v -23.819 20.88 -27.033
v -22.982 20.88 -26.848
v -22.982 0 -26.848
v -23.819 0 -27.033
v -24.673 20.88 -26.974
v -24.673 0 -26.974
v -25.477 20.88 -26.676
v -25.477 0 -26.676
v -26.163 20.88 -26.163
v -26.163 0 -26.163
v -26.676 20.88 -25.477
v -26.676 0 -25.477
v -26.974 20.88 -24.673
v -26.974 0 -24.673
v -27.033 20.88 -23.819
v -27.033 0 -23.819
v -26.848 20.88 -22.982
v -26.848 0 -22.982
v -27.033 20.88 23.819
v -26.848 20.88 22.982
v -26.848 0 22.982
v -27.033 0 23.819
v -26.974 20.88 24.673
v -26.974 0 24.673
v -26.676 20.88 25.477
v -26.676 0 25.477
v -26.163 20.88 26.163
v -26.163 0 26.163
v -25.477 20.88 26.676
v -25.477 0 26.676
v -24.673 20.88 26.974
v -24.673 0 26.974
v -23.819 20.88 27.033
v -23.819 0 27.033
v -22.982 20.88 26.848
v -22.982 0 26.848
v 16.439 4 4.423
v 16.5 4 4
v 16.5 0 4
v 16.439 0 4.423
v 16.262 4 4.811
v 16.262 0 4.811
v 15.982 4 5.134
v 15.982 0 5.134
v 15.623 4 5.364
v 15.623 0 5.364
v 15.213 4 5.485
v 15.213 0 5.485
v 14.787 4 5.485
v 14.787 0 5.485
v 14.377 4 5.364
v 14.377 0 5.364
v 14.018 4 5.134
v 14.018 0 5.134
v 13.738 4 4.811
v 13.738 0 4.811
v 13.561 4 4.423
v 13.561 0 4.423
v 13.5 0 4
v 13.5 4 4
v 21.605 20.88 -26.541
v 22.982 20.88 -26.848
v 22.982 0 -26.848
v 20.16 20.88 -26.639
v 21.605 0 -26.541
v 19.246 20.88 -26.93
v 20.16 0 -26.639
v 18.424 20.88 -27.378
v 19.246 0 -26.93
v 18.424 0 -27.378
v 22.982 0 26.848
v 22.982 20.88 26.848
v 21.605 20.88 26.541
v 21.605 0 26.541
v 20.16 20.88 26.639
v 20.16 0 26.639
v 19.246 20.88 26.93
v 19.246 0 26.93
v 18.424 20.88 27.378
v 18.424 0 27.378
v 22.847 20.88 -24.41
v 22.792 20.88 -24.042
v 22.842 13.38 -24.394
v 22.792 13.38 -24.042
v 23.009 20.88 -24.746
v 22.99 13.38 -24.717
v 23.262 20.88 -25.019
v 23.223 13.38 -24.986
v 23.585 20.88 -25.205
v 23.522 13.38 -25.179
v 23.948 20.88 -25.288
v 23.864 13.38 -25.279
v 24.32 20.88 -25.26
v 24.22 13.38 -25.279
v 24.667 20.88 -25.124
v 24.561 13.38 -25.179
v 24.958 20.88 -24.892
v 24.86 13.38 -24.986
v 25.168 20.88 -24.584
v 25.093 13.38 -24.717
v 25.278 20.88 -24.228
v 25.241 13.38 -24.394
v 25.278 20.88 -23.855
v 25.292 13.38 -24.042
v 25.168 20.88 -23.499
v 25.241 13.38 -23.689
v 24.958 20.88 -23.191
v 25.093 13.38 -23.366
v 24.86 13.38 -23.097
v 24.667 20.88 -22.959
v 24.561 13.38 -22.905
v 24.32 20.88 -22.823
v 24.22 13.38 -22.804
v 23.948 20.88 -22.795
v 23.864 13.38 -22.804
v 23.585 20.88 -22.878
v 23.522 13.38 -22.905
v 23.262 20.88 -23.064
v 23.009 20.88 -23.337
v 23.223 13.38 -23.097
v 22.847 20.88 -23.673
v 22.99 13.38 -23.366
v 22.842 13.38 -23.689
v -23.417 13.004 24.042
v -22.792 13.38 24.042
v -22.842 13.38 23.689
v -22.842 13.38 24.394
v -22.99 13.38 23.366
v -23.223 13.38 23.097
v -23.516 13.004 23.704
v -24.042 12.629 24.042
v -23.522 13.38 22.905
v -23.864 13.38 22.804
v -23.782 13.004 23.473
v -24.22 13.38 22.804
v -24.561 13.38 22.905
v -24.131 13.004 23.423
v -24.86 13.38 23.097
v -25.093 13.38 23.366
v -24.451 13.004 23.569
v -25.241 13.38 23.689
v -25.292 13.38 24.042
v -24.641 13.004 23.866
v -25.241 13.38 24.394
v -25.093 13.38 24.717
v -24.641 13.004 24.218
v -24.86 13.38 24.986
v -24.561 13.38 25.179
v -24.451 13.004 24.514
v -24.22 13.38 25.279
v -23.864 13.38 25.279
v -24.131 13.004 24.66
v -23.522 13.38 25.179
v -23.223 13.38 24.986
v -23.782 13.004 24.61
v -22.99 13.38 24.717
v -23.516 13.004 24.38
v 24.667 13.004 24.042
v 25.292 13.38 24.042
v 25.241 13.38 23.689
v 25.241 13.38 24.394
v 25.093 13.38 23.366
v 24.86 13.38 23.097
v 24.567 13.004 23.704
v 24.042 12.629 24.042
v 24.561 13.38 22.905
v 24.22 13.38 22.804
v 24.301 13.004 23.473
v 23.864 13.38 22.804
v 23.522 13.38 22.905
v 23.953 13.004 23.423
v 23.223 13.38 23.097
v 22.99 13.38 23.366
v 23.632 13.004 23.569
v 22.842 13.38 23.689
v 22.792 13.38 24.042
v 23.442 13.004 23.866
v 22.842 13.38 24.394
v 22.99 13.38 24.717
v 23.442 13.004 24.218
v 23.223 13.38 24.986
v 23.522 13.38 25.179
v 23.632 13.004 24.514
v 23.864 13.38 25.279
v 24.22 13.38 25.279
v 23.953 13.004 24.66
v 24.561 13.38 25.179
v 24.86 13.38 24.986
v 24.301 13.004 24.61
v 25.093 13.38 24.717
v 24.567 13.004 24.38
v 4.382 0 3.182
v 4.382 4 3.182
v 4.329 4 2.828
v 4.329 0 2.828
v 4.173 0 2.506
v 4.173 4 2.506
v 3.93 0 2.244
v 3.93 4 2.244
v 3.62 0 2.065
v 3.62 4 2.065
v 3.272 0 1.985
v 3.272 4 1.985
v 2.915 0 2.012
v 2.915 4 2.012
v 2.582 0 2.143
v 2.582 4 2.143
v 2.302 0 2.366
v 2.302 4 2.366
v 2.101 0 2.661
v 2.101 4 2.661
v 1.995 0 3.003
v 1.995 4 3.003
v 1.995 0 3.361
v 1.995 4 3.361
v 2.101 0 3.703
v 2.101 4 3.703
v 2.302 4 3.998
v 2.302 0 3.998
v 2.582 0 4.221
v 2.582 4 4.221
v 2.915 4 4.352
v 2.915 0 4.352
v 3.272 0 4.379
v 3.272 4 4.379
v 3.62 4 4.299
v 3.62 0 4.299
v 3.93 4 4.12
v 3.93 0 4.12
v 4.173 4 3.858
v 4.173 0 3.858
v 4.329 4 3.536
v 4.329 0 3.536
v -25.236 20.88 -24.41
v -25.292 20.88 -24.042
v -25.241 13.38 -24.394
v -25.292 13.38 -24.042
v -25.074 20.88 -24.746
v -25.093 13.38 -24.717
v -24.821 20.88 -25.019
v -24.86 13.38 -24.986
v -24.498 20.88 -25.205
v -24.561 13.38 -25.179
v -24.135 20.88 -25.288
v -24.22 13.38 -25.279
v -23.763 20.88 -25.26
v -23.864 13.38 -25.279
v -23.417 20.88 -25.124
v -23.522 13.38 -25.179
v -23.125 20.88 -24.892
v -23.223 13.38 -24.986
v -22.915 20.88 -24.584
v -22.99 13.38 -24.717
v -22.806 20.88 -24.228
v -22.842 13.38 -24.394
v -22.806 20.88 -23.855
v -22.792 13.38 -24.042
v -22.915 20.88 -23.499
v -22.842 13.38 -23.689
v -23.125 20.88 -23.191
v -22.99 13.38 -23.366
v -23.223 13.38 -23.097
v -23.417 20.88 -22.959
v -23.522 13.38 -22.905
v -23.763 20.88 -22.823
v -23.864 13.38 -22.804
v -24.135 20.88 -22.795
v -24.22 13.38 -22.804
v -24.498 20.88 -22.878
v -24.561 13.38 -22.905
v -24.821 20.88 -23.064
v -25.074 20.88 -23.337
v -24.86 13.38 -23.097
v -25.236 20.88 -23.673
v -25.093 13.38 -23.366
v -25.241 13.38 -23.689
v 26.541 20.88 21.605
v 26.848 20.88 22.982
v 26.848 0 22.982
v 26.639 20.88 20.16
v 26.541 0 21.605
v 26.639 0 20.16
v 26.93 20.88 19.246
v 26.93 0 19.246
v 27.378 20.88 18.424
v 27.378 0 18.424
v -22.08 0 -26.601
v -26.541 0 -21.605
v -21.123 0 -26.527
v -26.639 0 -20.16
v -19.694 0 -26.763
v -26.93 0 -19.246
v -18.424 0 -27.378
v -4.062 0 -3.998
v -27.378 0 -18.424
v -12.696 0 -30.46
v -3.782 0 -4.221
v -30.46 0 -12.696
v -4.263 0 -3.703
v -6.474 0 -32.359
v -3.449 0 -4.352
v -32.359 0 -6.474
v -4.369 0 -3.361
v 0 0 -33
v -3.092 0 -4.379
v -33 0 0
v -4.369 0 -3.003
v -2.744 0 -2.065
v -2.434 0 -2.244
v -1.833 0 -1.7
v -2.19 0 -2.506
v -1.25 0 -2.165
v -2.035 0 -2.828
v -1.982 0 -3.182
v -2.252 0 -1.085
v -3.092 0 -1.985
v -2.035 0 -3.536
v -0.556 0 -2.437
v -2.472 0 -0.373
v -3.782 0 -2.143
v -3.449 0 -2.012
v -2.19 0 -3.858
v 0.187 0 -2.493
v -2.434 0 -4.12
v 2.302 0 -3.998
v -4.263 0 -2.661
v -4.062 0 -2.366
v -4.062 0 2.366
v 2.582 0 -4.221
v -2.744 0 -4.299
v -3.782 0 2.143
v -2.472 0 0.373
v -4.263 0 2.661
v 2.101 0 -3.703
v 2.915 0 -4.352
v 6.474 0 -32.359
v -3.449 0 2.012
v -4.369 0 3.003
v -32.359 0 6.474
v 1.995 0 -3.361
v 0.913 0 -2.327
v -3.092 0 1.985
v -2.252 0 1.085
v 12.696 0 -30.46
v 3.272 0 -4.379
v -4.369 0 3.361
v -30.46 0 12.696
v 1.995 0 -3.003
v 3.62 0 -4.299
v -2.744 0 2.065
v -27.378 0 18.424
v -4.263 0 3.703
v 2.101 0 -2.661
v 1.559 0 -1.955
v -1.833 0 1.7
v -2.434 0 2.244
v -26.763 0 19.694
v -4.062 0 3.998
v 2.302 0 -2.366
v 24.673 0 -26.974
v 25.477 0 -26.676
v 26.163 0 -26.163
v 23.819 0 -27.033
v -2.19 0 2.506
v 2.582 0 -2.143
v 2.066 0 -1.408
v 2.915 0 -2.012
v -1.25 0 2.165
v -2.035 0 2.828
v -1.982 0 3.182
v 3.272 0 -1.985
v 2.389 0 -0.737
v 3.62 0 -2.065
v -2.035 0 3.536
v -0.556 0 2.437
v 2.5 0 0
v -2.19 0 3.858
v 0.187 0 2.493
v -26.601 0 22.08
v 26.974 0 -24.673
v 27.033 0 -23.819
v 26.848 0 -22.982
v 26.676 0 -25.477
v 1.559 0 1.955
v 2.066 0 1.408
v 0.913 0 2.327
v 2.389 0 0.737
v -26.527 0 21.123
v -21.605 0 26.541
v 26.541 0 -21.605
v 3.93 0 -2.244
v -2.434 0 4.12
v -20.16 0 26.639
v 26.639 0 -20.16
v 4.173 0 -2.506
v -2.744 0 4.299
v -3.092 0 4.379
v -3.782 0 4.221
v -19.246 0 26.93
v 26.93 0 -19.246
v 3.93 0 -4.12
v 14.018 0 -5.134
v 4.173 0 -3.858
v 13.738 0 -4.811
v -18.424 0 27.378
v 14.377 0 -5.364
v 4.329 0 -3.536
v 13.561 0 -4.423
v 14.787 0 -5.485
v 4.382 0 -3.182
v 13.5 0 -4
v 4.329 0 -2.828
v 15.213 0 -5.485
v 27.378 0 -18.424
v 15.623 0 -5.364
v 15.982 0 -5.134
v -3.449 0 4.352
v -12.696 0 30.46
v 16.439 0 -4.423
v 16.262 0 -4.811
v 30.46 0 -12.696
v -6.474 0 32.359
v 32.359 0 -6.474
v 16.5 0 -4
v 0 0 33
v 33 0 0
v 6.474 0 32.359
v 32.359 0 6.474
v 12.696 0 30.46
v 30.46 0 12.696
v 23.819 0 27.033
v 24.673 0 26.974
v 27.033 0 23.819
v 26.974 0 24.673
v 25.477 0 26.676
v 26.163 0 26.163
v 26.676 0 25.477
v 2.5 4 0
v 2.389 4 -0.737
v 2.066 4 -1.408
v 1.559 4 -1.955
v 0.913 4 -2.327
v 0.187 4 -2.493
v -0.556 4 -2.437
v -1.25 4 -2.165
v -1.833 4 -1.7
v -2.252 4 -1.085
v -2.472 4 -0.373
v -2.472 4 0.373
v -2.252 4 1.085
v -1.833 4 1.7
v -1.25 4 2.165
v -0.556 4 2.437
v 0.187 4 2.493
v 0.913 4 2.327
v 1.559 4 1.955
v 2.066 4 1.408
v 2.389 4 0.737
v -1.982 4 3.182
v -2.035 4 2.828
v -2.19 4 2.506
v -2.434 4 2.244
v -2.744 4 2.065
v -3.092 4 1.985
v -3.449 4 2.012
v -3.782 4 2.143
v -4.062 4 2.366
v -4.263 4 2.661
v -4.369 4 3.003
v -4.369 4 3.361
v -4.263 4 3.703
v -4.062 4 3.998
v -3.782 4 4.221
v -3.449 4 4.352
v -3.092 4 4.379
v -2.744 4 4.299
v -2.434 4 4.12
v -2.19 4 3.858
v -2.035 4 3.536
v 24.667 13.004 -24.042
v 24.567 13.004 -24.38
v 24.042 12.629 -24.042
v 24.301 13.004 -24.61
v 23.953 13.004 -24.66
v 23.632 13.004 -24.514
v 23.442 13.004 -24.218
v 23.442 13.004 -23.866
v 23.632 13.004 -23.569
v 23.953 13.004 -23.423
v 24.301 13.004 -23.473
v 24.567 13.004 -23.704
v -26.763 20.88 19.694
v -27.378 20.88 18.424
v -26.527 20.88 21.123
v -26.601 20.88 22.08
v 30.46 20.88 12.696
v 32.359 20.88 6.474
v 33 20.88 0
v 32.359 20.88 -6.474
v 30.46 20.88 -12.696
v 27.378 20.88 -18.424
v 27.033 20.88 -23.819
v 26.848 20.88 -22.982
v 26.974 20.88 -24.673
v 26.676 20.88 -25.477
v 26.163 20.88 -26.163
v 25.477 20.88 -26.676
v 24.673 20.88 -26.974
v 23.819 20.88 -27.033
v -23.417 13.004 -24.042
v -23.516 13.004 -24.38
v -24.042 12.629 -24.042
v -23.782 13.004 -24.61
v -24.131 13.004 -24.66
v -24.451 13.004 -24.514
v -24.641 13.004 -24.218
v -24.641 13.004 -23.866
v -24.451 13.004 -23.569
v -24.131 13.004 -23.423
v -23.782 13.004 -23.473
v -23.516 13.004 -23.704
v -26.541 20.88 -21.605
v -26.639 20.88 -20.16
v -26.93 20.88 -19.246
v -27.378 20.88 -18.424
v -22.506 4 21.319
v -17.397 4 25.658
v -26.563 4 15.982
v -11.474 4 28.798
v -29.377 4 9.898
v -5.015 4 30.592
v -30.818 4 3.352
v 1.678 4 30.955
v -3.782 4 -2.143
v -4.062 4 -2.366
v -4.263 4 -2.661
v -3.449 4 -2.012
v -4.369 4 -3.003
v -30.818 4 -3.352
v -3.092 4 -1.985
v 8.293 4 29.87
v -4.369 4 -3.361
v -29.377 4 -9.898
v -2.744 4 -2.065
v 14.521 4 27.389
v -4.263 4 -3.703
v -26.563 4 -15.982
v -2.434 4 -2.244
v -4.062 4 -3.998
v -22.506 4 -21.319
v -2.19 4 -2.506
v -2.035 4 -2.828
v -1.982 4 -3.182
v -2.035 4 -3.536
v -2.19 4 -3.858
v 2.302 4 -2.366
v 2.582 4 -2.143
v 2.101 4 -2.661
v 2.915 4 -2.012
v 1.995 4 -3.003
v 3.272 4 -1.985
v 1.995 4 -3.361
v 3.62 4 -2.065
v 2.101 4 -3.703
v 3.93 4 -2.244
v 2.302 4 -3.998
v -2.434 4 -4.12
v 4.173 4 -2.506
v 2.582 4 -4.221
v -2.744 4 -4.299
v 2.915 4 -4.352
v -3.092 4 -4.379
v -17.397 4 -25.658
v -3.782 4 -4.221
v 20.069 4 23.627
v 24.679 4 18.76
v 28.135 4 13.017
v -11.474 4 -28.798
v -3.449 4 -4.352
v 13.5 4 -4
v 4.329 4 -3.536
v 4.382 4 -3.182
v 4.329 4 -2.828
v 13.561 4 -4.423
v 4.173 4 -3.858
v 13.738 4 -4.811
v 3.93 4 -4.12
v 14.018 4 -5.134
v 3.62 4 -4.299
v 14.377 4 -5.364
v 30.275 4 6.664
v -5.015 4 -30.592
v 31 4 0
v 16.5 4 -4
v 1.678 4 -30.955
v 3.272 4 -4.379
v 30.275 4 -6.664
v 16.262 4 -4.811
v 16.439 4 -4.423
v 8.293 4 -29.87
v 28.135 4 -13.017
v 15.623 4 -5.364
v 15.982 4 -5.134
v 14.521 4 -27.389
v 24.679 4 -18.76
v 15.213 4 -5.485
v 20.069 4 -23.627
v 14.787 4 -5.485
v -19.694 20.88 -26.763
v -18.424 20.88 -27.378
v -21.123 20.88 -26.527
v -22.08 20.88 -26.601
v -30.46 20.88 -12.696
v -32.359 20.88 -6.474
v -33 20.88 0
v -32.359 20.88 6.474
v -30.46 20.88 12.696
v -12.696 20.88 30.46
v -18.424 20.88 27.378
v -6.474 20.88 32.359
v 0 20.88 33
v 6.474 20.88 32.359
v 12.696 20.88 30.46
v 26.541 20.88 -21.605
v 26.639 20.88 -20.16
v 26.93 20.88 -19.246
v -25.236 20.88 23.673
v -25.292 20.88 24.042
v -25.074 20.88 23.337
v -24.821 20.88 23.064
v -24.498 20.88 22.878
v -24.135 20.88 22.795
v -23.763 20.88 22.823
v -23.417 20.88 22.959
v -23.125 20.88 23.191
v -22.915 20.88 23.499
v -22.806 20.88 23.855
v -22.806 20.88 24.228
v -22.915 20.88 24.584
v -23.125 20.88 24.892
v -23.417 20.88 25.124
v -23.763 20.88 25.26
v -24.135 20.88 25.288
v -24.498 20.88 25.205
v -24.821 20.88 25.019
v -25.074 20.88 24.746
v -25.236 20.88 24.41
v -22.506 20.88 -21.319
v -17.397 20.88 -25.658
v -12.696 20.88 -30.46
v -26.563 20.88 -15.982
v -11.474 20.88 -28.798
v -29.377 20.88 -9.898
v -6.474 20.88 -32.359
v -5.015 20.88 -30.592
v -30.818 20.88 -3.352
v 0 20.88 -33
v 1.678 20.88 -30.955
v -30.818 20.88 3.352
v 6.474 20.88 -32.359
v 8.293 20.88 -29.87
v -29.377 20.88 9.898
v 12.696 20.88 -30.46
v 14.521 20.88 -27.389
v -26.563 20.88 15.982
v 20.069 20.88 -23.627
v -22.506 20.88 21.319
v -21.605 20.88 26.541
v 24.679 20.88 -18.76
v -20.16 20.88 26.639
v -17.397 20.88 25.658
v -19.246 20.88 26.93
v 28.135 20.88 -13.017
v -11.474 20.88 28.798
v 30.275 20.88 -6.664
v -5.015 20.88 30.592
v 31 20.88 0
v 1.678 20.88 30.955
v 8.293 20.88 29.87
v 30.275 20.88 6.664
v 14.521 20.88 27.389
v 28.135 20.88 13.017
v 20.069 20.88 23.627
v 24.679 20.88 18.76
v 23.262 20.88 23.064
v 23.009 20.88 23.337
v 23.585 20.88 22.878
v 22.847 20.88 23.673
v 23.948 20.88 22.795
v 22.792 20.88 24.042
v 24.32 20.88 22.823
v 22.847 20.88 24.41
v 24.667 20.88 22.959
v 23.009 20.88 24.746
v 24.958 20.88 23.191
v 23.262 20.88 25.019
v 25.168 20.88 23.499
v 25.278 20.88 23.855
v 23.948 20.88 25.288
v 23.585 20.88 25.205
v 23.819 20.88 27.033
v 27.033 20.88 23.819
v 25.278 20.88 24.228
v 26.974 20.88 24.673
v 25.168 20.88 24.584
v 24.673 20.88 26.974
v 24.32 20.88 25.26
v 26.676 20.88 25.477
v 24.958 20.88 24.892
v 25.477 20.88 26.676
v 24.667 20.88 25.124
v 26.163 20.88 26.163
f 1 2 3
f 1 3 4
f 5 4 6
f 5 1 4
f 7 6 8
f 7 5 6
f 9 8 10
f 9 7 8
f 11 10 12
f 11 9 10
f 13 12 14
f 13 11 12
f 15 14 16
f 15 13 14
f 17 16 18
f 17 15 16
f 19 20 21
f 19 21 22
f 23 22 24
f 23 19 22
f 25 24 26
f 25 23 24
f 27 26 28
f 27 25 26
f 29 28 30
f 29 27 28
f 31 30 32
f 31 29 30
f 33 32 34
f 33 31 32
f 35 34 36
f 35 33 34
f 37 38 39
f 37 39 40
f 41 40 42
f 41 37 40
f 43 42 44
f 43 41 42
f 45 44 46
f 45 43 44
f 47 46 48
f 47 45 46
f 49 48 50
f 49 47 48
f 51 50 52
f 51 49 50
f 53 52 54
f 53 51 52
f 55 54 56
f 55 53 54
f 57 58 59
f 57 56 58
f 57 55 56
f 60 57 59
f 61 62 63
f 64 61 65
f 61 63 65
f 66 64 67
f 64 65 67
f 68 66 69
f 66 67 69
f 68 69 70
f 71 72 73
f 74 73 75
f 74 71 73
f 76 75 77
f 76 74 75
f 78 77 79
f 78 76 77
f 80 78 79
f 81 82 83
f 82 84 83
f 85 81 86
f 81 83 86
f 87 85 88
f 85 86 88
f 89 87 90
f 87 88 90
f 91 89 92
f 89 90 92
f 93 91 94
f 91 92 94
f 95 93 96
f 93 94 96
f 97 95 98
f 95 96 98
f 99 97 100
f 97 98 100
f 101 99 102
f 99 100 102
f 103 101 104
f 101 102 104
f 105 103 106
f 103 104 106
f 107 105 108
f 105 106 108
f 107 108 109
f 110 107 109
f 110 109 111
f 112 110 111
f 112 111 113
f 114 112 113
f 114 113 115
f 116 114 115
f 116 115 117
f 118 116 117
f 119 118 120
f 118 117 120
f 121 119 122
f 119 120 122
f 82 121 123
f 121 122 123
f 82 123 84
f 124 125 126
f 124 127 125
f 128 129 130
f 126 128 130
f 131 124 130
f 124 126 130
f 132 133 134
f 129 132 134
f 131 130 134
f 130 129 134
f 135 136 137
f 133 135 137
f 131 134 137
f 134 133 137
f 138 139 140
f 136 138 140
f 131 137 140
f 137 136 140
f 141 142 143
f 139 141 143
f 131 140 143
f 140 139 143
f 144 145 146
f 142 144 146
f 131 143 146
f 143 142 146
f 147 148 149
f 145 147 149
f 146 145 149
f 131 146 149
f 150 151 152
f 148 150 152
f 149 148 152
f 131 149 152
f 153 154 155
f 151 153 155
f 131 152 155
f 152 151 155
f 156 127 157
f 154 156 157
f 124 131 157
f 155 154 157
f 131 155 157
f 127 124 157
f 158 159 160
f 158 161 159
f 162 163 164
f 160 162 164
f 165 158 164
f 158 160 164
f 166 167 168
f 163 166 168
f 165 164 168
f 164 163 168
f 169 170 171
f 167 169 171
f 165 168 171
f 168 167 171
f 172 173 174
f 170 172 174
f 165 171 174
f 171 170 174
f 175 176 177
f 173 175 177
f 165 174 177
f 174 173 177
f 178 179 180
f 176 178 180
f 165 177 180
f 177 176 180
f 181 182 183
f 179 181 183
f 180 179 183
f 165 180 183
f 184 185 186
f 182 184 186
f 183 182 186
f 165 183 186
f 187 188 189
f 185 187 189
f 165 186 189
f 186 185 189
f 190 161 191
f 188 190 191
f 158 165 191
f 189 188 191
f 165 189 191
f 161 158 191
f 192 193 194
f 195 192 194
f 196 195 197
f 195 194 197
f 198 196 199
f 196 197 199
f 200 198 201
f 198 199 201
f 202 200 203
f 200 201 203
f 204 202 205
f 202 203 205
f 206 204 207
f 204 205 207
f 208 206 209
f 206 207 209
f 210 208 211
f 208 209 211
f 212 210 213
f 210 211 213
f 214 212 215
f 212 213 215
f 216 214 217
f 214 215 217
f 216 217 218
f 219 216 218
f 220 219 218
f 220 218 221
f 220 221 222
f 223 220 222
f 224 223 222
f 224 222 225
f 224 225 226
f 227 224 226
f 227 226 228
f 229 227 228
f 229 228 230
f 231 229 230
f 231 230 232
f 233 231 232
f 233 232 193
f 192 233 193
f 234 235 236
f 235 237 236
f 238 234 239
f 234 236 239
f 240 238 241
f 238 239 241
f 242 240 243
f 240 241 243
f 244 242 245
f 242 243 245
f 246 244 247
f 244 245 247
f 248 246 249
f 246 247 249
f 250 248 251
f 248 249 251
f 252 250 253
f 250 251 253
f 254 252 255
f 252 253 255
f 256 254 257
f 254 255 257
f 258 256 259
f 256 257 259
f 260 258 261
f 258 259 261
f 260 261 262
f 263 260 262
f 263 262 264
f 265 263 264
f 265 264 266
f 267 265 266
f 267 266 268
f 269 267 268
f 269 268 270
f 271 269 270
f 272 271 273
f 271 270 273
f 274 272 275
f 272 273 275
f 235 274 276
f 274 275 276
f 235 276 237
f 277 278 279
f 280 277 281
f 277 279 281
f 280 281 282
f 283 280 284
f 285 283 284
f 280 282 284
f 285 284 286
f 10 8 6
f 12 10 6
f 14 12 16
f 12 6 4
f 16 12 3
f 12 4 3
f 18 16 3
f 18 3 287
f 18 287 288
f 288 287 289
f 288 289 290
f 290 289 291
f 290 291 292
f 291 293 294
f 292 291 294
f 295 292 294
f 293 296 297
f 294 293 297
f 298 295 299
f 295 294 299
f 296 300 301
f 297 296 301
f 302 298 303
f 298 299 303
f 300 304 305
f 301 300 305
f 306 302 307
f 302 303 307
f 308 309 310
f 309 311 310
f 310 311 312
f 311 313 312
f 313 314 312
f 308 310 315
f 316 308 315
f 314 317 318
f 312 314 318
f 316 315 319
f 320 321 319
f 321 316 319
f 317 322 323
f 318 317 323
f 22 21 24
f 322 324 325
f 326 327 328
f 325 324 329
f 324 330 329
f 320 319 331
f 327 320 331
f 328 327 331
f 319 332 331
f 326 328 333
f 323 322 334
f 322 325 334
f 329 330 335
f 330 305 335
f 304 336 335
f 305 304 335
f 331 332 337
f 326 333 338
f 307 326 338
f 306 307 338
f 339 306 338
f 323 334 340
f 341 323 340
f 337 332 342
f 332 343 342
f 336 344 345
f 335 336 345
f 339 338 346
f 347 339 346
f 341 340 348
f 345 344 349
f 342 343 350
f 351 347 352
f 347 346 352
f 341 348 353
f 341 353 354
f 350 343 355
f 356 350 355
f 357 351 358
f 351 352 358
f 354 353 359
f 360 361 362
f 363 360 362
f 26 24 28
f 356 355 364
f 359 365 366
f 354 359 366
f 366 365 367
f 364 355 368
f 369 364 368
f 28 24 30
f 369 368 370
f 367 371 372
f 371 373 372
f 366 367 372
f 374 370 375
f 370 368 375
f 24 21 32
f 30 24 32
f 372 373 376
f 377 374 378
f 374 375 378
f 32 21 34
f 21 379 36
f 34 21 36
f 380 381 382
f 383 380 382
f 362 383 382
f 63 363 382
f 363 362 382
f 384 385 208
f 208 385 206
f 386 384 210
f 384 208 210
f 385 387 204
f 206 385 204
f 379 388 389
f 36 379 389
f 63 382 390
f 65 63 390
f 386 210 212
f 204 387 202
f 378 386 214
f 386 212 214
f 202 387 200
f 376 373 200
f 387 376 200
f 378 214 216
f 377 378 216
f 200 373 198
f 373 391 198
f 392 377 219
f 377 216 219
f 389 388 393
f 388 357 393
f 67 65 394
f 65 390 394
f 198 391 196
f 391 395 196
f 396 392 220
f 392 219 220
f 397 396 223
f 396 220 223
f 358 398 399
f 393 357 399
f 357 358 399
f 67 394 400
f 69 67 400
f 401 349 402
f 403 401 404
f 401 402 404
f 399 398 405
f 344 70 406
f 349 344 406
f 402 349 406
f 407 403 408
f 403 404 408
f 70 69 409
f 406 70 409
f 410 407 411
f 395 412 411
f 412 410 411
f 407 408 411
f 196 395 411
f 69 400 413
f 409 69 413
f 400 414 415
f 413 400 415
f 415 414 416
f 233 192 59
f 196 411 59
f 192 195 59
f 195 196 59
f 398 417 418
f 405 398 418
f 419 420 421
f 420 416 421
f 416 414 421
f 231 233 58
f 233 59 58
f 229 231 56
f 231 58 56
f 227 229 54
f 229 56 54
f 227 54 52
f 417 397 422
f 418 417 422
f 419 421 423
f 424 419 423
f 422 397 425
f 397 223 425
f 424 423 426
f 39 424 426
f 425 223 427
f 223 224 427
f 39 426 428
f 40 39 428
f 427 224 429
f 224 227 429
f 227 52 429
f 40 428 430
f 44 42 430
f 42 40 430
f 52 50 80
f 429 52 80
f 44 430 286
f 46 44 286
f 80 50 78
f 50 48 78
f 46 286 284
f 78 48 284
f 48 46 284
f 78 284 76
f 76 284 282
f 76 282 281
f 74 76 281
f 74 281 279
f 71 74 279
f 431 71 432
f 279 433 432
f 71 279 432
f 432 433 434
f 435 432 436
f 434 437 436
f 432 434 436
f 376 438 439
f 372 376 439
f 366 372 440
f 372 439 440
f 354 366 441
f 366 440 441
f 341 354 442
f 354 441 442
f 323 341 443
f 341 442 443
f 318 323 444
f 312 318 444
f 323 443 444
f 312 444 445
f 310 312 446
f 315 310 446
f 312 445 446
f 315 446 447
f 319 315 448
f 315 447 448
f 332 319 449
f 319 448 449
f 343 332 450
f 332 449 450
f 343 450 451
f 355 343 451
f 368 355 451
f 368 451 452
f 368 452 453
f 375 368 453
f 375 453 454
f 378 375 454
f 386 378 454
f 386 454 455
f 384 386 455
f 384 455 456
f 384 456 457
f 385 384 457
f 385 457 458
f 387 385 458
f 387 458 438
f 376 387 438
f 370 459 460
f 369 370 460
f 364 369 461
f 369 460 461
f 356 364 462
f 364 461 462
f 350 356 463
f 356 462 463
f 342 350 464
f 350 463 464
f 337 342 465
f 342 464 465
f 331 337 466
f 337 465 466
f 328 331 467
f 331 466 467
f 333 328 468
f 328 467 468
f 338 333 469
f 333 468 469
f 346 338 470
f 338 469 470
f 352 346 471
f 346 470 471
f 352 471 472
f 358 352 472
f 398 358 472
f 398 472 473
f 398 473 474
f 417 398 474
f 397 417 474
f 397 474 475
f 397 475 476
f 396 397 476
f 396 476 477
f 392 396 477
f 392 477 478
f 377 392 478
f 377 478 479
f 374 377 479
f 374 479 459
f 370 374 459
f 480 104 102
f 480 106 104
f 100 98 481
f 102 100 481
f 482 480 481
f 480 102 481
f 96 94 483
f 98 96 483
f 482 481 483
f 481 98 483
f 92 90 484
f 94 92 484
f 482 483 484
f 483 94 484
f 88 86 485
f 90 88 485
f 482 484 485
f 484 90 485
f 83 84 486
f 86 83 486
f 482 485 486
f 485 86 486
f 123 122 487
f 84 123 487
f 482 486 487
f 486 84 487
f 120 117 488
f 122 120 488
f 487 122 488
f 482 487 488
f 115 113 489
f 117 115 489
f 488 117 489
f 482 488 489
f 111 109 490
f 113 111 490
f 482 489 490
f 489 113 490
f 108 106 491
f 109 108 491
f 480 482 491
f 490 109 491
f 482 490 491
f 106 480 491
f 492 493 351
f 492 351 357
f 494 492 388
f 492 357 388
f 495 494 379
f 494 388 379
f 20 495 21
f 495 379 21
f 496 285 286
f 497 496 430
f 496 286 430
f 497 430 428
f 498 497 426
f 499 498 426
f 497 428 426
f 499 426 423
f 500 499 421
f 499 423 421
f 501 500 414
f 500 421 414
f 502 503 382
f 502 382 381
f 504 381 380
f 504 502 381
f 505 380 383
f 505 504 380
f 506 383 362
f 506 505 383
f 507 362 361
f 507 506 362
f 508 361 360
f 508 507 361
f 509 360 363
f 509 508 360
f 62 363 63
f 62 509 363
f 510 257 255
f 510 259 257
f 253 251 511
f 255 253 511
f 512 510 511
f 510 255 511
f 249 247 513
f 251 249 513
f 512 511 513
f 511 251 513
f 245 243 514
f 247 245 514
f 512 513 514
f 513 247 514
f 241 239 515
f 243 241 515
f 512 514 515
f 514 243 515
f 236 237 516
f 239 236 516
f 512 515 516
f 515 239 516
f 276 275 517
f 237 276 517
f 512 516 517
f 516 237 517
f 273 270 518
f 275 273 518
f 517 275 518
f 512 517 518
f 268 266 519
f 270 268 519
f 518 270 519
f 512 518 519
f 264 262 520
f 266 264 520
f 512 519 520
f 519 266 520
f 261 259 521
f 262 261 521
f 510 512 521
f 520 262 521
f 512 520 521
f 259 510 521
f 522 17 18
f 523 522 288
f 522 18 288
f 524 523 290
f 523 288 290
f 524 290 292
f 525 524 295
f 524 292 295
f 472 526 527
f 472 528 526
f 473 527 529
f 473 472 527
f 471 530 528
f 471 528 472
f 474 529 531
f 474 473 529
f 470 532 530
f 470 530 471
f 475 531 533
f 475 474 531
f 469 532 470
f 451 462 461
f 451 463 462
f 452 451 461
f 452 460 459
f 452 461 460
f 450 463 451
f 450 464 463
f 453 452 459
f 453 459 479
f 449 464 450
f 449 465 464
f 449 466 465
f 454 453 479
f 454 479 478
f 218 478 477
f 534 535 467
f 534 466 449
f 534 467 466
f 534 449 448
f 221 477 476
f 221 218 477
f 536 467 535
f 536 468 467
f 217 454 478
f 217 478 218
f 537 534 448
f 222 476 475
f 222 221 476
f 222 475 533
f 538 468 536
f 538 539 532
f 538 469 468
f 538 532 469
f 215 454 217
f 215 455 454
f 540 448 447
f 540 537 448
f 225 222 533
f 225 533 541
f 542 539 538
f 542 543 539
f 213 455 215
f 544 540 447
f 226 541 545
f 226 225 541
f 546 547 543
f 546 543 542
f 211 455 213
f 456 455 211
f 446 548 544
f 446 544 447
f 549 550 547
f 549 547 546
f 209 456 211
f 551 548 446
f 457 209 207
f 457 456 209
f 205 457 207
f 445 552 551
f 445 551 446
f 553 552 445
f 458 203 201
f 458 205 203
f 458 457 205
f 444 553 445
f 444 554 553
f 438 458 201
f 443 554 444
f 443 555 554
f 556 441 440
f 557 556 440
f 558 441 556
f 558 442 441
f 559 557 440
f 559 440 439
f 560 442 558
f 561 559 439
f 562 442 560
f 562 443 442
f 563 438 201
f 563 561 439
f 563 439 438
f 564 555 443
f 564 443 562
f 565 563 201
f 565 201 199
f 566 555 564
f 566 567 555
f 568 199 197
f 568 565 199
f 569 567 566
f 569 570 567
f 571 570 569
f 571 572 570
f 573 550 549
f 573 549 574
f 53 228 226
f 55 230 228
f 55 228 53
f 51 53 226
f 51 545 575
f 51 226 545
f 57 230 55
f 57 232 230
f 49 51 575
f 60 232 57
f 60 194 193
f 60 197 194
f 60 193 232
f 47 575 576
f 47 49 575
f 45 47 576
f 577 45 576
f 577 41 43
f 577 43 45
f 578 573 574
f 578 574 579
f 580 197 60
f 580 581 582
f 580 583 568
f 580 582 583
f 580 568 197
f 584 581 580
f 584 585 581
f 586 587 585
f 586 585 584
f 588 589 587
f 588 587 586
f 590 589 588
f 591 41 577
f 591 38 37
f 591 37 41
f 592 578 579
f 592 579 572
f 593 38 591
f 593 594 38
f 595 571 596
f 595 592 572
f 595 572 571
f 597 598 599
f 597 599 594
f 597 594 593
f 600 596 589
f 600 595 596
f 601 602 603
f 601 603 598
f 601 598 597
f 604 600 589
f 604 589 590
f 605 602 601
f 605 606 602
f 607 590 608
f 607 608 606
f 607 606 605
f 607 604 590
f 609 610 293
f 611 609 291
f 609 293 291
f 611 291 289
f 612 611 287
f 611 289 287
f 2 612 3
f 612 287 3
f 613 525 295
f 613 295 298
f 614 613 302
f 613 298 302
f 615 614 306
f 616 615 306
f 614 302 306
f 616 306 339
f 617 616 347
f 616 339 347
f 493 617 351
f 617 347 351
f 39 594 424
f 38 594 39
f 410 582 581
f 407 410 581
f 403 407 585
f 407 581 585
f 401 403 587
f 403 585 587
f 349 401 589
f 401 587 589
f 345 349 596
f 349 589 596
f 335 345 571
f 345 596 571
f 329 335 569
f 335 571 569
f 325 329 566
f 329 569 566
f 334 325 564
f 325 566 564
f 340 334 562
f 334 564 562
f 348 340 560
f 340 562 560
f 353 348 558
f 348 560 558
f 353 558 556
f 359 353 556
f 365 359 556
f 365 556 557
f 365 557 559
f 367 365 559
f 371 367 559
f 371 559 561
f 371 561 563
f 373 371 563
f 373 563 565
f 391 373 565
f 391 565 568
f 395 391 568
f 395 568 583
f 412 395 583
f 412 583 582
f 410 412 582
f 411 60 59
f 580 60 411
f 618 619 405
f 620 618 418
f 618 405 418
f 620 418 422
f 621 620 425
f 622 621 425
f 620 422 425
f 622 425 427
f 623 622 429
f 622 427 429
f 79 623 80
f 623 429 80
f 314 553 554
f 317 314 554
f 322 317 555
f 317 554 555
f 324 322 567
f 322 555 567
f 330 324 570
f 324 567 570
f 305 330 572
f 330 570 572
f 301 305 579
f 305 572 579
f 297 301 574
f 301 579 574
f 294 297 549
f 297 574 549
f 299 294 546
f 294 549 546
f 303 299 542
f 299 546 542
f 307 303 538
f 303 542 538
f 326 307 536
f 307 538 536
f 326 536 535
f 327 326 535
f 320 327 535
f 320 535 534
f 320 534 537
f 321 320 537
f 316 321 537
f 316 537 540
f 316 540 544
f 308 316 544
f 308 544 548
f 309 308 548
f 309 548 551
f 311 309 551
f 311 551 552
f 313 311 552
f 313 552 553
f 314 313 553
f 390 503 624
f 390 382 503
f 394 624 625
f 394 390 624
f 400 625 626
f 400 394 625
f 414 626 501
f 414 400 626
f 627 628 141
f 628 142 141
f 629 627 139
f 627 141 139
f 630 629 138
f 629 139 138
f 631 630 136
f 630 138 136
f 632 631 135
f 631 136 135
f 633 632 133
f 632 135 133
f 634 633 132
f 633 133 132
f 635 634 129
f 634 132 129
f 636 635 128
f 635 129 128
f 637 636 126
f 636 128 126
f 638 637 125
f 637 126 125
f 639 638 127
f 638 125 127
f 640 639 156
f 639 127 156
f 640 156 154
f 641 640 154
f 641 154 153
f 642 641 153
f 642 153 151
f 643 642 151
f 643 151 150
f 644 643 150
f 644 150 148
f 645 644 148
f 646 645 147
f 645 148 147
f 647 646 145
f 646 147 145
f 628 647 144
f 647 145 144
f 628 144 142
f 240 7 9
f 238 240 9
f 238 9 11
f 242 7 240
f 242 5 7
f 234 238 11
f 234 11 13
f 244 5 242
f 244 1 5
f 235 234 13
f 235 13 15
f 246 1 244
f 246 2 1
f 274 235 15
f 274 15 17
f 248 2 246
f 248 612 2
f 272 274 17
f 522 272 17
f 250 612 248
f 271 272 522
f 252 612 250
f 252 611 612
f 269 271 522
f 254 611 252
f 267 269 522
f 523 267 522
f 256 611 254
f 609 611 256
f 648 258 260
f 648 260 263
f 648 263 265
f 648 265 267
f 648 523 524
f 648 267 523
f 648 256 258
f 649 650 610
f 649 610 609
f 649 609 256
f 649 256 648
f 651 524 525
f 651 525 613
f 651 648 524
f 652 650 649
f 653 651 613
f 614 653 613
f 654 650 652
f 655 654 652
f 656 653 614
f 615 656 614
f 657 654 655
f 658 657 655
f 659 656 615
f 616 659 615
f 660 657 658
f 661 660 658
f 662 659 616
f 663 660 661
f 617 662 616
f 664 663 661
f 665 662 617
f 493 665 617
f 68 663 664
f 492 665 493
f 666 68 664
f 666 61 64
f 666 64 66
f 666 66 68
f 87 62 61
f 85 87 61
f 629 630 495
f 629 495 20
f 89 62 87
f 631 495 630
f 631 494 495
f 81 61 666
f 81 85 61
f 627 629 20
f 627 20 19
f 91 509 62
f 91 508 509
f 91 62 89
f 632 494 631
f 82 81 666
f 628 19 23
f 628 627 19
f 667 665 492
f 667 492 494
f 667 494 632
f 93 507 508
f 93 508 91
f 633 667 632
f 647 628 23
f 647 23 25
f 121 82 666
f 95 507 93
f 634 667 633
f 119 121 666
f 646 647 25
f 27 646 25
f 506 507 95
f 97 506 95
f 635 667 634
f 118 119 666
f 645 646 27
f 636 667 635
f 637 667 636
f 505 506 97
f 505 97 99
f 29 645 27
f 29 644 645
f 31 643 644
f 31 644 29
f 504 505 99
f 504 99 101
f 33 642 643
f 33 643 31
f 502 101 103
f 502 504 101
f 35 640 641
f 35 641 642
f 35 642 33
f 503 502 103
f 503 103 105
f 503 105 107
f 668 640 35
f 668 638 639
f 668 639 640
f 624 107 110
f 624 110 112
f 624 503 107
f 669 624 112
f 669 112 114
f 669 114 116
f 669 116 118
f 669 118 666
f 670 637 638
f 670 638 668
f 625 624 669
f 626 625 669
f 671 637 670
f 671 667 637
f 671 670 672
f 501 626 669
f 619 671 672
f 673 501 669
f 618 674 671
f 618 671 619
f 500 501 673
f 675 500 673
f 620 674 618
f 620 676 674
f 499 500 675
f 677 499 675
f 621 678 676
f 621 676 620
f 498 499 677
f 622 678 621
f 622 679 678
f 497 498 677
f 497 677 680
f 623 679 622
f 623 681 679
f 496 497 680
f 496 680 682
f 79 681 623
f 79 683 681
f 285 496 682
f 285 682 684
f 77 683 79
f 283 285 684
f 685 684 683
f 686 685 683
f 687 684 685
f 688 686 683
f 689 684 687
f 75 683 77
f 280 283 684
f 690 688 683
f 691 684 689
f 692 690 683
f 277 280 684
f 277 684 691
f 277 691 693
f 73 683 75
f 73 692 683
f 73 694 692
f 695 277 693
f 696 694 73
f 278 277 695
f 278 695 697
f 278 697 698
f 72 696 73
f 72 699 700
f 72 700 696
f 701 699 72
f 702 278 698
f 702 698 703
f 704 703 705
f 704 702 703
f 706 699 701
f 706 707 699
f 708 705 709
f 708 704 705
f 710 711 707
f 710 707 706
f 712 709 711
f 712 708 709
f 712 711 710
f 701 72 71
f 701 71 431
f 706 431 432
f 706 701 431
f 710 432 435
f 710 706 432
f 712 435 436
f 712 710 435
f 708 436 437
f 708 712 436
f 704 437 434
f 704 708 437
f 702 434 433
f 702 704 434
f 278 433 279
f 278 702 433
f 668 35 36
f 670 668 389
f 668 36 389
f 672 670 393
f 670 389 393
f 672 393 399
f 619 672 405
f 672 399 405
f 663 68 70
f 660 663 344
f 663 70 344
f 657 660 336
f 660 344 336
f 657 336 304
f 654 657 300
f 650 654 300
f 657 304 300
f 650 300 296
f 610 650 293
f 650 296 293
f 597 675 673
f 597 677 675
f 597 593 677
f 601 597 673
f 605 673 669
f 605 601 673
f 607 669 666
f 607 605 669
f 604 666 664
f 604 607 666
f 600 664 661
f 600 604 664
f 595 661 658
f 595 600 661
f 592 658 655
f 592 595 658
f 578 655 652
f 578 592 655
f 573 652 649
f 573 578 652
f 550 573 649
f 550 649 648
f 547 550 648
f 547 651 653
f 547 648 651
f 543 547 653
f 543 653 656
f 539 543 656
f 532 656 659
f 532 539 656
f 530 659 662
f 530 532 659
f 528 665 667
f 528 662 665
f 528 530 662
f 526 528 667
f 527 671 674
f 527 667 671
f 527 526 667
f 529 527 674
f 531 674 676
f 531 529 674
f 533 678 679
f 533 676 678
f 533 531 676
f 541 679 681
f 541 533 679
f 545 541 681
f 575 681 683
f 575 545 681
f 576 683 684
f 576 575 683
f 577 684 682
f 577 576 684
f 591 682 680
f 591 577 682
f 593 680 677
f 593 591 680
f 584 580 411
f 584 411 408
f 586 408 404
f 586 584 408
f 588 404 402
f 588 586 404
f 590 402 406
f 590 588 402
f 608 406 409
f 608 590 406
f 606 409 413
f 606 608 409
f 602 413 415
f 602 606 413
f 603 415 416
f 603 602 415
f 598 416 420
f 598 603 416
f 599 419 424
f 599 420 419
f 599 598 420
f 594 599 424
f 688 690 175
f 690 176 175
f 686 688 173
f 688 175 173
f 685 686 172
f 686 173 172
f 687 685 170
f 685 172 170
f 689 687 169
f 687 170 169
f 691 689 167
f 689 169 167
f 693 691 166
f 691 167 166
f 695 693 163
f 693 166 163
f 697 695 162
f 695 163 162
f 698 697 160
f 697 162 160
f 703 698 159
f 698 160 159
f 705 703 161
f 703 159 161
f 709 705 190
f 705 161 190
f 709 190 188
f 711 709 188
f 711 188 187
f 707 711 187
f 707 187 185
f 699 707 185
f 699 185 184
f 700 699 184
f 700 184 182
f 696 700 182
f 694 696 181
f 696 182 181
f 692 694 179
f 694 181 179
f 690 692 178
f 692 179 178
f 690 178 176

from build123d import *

# Parameters (mm, degrees)
SKETCH1_R                 = 33
BOSS_EXTRUDE1_DEPTH       = 4
SKETCH2_R                 = 33
SKETCH2_R_2               = 31
BOSS_EXTRUDE2_DEPTH       = 16.88
M2_CLEARANCE_HOLE1_D      = 2.4
SKETCH13_R                = 2.5
CUT_EXTRUDE3_DEPTH        = 5
CUT_EXTRUDE2_DEPTH        = 5
SKETCH15_R                = 3
BOSS_EXTRUDE3_DEPTH       = 20.88
FILLET1_R                 = 5
CIRPATTERN1_COUNT         = 4
FILLET1_OF_CIRPATTERN1_R  = 5
M3X0_5_TAPPED_HOLE1_D     = 2.5
M3X0_5_TAPPED_HOLE1_DEPTH = 7.5
M3X0_5_TAPPED_HOLE1_TIP   = 0.751075774


with BuildPart() as part:
    # Sketch1 → Boss-Extrude1 (new body)
    with BuildSketch(Plane(origin=(0, 0, 0), x_dir=(1, 0, 0), z_dir=(0, 1, 0))):
        Circle(SKETCH1_R)
    extrude(amount=BOSS_EXTRUDE1_DEPTH)

    # Sketch2 → Boss-Extrude2 (add)
    with BuildSketch(Plane(origin=(0, 4, 0), x_dir=(1, 0, 0), z_dir=(0, 1, 0))):
        Circle(SKETCH2_R)
        Circle(SKETCH2_R_2, mode=Mode.SUBTRACT)
    extrude(amount=BOSS_EXTRUDE2_DEPTH)

    # M2 Clearance Hole1 (through all)
    with Locations(Plane(origin=(0, 0, 0), x_dir=(-1, 0, 0), z_dir=(0, -1, 0))):
        with Locations((3.181980515, 3.181980515), (3.181980515, -3.181980515), (-3.181980515, -3.181980515), (-3.181980515, 3.181980515)):
            Hole(M2_CLEARANCE_HOLE1_D / 2)

    # Sketch13 → Cut-Extrude3 (cut, through all)
    with BuildSketch(Plane(origin=(0, 4, 0), x_dir=(1, 0, 0), z_dir=(0, 1, 0))):
        Circle(SKETCH13_R)
    extrude(amount=-CUT_EXTRUDE3_DEPTH, mode=Mode.SUBTRACT)

    # Sketch10 → Cut-Extrude2 (cut, through all)
    with BuildSketch(Plane(origin=(0, 4, 0), x_dir=(1, 0, 0), z_dir=(0, 1, 0))):
        with BuildLine():
            Line((13.5, -4), (13.5, 4))
            ThreePointArc((13.5, 4), (15, 5.5), (16.5, 4))
            Line((16.5, 4), (16.5, -4))
            ThreePointArc((16.5, -4), (15, -5.5), (13.5, -4))
        make_face()
    extrude(amount=-CUT_EXTRUDE2_DEPTH, mode=Mode.SUBTRACT)

    # Sketch15 → Boss-Extrude3 (add, through all)
    with BuildSketch(Plane(origin=(0, 20.88, 0), x_dir=(1, 0, 0), z_dir=(0, 1, 0))):
        with Locations((24.04163056, 24.04163056)):
            Circle(SKETCH15_R)
    boss_extrude3 = extrude(amount=-BOSS_EXTRUDE3_DEPTH)

    # Fillet1
    fillet1_edges = [part.edges().sort_by_distance(p)[0] for p in [
        (25.219946573, 10.44, -21.282722919),
        (21.282722919, 10.44, -25.219946573),
    ]]
    fillet(fillet1_edges, radius=FILLET1_R)

    # CirPattern1: Boss-Extrude3 ×4 about axis
    cirpattern1_axis = Axis((0, 0, 0), (0, 1, 0))
    for i in range(1, CIRPATTERN1_COUNT):
        add(boss_extrude3.rotate(cirpattern1_axis, i * 360 / CIRPATTERN1_COUNT))

    # Fillet1 of CirPattern1
    fillet1_of_cirpattern1_edges = [part.edges().sort_by_distance(p)[0] for p in [
        (-21.282722919, 10.44, -25.219946573),
        (-25.219946573, 10.44, -21.282722919),
        (-25.219946573, 10.44, 21.282722919),
        (-21.282722919, 10.44, 25.219946573),
        (21.282722919, 10.44, 25.219946573),
        (25.219946573, 10.44, 21.282722919),
    ]]
    fillet(fillet1_of_cirpattern1_edges, radius=FILLET1_OF_CIRPATTERN1_R)

    # M3x0.5 Tapped Hole1
    with Locations(Plane(origin=(0, 20.88, 0), x_dir=(1, 0, 0), z_dir=(0, 1, 0))):
        with Locations((24.04163056, -24.04163056), (-24.04163056, -24.04163056), (-24.04163056, 24.04163056), (24.04163056, 24.04163056)):
            Hole(M3X0_5_TAPPED_HOLE1_D / 2, depth=M3X0_5_TAPPED_HOLE1_DEPTH)
            with Locations((0, 0, -(M3X0_5_TAPPED_HOLE1_DEPTH + M3X0_5_TAPPED_HOLE1_TIP / 2))):  # 118° drill point
                Cone(0, M3X0_5_TAPPED_HOLE1_D / 2, M3X0_5_TAPPED_HOLE1_TIP, mode=Mode.SUBTRACT)


solid = part.part
